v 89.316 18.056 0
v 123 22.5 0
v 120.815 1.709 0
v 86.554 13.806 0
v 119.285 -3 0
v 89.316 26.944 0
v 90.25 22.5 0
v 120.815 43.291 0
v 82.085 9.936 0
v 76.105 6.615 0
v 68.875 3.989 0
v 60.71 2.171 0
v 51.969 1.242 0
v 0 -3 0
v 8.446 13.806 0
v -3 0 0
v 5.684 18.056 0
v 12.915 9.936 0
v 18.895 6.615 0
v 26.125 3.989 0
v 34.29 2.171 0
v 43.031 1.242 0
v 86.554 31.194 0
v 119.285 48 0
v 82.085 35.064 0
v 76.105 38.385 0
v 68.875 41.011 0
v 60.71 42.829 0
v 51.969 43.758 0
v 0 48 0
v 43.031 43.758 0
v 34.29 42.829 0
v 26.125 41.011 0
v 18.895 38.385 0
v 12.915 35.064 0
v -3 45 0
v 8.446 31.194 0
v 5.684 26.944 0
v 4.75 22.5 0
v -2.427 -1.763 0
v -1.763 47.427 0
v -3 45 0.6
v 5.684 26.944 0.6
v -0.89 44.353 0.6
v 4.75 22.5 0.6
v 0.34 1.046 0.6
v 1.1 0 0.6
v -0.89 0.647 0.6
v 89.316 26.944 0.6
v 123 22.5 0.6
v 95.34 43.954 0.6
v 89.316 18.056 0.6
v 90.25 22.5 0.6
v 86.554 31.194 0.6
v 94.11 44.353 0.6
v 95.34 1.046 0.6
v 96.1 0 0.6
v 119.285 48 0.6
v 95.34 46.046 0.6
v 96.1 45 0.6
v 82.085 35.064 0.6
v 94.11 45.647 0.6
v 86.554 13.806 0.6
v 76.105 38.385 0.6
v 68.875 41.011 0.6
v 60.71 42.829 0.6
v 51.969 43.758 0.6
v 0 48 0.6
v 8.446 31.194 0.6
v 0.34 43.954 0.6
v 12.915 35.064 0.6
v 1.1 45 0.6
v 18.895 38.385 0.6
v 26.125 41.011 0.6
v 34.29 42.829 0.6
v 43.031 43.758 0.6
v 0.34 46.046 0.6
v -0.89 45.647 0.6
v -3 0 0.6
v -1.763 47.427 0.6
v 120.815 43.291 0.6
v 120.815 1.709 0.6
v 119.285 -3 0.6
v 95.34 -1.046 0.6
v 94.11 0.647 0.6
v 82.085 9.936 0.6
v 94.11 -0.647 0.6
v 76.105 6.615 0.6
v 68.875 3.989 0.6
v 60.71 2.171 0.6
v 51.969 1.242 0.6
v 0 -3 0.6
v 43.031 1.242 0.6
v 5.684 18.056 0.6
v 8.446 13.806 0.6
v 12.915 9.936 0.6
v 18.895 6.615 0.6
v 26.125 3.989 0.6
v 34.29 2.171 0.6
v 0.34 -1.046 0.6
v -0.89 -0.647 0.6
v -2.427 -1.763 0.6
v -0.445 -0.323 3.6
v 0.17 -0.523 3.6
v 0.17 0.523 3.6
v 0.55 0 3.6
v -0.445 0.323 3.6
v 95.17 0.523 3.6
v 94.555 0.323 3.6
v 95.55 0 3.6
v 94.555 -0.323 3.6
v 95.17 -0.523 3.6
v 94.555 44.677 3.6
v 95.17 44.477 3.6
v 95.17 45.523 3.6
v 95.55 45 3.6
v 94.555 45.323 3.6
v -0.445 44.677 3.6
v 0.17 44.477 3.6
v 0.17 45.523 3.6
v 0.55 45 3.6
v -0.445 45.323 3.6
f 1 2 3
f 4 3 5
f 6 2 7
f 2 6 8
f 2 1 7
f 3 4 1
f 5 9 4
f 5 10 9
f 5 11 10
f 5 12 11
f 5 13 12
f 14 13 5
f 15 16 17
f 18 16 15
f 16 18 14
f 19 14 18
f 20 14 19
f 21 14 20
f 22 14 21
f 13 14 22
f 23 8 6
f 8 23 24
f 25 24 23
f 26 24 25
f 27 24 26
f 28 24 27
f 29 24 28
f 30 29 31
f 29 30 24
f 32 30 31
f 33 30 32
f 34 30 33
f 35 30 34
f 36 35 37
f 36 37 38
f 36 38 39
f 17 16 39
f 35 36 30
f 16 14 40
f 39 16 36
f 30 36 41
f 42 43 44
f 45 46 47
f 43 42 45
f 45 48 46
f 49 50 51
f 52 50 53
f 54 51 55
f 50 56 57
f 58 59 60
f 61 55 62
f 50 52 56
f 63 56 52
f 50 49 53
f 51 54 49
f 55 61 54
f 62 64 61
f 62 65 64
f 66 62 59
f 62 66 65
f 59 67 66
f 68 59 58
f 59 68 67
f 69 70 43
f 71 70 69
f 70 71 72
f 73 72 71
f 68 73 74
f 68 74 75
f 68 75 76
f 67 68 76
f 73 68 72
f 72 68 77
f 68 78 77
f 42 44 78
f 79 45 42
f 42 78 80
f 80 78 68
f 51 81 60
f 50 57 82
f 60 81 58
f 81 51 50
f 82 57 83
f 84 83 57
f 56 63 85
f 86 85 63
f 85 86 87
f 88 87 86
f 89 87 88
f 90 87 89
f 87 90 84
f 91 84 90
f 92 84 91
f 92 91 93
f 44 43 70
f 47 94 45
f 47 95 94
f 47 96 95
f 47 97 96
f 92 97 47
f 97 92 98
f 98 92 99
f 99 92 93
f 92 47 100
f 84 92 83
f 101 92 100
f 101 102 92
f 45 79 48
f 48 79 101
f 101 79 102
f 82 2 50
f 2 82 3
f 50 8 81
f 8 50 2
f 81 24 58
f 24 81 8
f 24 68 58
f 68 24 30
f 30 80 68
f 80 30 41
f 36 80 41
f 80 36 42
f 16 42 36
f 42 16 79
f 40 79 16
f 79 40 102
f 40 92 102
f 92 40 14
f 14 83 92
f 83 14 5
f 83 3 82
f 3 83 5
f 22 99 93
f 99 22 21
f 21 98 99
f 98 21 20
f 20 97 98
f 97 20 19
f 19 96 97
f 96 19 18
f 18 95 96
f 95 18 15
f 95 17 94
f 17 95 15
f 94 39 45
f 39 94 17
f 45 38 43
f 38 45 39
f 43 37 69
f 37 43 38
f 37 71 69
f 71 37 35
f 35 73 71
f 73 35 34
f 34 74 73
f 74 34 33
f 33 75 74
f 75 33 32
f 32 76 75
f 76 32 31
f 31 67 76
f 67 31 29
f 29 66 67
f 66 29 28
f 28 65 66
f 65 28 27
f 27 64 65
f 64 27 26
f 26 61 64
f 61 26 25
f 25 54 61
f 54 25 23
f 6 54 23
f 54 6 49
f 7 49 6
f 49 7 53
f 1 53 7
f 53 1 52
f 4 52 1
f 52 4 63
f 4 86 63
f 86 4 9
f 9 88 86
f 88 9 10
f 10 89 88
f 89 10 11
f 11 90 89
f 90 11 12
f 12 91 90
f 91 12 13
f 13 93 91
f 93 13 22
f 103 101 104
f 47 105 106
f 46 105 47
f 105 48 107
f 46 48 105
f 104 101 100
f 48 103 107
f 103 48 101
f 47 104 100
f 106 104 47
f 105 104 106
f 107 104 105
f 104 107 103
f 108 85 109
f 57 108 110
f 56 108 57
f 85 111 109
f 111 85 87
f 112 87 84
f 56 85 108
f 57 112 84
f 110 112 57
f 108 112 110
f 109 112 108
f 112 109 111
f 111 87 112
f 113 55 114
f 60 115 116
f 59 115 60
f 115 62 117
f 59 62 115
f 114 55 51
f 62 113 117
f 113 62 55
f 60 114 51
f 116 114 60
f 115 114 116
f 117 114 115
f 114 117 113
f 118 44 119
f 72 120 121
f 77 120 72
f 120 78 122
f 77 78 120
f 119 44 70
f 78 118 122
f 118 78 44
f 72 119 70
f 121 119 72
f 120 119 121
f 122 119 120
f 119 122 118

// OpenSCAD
guideHeight = 3;
guideBottomDiameter = 2.2;
guideTopDiameter = guideBottomDiameter * 0.5;
guideOffsetX = 95;
guideOffsetY = 45;

basePadding = 3;
baseHeight = 0.6;

//sample
boardSupport(supportRadius = 100);

module boardSupport(supportRadius) {
  linear_extrude(baseHeight)
  
  intersection() {
    difference() {
      offset(r = basePadding)
      square([guideOffsetX + 25, guideOffsetY]);
      
      translate([guideOffsetX / 2, guideOffsetY / 2])
      scale([0.9, 0.45])
      circle(d = guideOffsetX);
    }
    
    translate([guideOffsetX + 25 + basePadding - supportRadius, guideOffsetY / 2])
    circle(r = supportRadius);
  }

  translate([0, 0, baseHeight])
  cylinder(h = guideHeight, d1 = guideBottomDiameter, d2 = guideTopDiameter);

  translate([guideOffsetX, 0, baseHeight])
  cylinder(h = guideHeight, d1 = guideBottomDiameter, d2 = guideTopDiameter);

  translate([guideOffsetX, guideOffsetY, baseHeight])
  cylinder(h = guideHeight, d1 = guideBottomDiameter, d2 = guideTopDiameter);

  translate([0, guideOffsetY, baseHeight])
  cylinder(h = guideHeight, d1 = guideBottomDiameter, d2 = guideTopDiameter);
}
